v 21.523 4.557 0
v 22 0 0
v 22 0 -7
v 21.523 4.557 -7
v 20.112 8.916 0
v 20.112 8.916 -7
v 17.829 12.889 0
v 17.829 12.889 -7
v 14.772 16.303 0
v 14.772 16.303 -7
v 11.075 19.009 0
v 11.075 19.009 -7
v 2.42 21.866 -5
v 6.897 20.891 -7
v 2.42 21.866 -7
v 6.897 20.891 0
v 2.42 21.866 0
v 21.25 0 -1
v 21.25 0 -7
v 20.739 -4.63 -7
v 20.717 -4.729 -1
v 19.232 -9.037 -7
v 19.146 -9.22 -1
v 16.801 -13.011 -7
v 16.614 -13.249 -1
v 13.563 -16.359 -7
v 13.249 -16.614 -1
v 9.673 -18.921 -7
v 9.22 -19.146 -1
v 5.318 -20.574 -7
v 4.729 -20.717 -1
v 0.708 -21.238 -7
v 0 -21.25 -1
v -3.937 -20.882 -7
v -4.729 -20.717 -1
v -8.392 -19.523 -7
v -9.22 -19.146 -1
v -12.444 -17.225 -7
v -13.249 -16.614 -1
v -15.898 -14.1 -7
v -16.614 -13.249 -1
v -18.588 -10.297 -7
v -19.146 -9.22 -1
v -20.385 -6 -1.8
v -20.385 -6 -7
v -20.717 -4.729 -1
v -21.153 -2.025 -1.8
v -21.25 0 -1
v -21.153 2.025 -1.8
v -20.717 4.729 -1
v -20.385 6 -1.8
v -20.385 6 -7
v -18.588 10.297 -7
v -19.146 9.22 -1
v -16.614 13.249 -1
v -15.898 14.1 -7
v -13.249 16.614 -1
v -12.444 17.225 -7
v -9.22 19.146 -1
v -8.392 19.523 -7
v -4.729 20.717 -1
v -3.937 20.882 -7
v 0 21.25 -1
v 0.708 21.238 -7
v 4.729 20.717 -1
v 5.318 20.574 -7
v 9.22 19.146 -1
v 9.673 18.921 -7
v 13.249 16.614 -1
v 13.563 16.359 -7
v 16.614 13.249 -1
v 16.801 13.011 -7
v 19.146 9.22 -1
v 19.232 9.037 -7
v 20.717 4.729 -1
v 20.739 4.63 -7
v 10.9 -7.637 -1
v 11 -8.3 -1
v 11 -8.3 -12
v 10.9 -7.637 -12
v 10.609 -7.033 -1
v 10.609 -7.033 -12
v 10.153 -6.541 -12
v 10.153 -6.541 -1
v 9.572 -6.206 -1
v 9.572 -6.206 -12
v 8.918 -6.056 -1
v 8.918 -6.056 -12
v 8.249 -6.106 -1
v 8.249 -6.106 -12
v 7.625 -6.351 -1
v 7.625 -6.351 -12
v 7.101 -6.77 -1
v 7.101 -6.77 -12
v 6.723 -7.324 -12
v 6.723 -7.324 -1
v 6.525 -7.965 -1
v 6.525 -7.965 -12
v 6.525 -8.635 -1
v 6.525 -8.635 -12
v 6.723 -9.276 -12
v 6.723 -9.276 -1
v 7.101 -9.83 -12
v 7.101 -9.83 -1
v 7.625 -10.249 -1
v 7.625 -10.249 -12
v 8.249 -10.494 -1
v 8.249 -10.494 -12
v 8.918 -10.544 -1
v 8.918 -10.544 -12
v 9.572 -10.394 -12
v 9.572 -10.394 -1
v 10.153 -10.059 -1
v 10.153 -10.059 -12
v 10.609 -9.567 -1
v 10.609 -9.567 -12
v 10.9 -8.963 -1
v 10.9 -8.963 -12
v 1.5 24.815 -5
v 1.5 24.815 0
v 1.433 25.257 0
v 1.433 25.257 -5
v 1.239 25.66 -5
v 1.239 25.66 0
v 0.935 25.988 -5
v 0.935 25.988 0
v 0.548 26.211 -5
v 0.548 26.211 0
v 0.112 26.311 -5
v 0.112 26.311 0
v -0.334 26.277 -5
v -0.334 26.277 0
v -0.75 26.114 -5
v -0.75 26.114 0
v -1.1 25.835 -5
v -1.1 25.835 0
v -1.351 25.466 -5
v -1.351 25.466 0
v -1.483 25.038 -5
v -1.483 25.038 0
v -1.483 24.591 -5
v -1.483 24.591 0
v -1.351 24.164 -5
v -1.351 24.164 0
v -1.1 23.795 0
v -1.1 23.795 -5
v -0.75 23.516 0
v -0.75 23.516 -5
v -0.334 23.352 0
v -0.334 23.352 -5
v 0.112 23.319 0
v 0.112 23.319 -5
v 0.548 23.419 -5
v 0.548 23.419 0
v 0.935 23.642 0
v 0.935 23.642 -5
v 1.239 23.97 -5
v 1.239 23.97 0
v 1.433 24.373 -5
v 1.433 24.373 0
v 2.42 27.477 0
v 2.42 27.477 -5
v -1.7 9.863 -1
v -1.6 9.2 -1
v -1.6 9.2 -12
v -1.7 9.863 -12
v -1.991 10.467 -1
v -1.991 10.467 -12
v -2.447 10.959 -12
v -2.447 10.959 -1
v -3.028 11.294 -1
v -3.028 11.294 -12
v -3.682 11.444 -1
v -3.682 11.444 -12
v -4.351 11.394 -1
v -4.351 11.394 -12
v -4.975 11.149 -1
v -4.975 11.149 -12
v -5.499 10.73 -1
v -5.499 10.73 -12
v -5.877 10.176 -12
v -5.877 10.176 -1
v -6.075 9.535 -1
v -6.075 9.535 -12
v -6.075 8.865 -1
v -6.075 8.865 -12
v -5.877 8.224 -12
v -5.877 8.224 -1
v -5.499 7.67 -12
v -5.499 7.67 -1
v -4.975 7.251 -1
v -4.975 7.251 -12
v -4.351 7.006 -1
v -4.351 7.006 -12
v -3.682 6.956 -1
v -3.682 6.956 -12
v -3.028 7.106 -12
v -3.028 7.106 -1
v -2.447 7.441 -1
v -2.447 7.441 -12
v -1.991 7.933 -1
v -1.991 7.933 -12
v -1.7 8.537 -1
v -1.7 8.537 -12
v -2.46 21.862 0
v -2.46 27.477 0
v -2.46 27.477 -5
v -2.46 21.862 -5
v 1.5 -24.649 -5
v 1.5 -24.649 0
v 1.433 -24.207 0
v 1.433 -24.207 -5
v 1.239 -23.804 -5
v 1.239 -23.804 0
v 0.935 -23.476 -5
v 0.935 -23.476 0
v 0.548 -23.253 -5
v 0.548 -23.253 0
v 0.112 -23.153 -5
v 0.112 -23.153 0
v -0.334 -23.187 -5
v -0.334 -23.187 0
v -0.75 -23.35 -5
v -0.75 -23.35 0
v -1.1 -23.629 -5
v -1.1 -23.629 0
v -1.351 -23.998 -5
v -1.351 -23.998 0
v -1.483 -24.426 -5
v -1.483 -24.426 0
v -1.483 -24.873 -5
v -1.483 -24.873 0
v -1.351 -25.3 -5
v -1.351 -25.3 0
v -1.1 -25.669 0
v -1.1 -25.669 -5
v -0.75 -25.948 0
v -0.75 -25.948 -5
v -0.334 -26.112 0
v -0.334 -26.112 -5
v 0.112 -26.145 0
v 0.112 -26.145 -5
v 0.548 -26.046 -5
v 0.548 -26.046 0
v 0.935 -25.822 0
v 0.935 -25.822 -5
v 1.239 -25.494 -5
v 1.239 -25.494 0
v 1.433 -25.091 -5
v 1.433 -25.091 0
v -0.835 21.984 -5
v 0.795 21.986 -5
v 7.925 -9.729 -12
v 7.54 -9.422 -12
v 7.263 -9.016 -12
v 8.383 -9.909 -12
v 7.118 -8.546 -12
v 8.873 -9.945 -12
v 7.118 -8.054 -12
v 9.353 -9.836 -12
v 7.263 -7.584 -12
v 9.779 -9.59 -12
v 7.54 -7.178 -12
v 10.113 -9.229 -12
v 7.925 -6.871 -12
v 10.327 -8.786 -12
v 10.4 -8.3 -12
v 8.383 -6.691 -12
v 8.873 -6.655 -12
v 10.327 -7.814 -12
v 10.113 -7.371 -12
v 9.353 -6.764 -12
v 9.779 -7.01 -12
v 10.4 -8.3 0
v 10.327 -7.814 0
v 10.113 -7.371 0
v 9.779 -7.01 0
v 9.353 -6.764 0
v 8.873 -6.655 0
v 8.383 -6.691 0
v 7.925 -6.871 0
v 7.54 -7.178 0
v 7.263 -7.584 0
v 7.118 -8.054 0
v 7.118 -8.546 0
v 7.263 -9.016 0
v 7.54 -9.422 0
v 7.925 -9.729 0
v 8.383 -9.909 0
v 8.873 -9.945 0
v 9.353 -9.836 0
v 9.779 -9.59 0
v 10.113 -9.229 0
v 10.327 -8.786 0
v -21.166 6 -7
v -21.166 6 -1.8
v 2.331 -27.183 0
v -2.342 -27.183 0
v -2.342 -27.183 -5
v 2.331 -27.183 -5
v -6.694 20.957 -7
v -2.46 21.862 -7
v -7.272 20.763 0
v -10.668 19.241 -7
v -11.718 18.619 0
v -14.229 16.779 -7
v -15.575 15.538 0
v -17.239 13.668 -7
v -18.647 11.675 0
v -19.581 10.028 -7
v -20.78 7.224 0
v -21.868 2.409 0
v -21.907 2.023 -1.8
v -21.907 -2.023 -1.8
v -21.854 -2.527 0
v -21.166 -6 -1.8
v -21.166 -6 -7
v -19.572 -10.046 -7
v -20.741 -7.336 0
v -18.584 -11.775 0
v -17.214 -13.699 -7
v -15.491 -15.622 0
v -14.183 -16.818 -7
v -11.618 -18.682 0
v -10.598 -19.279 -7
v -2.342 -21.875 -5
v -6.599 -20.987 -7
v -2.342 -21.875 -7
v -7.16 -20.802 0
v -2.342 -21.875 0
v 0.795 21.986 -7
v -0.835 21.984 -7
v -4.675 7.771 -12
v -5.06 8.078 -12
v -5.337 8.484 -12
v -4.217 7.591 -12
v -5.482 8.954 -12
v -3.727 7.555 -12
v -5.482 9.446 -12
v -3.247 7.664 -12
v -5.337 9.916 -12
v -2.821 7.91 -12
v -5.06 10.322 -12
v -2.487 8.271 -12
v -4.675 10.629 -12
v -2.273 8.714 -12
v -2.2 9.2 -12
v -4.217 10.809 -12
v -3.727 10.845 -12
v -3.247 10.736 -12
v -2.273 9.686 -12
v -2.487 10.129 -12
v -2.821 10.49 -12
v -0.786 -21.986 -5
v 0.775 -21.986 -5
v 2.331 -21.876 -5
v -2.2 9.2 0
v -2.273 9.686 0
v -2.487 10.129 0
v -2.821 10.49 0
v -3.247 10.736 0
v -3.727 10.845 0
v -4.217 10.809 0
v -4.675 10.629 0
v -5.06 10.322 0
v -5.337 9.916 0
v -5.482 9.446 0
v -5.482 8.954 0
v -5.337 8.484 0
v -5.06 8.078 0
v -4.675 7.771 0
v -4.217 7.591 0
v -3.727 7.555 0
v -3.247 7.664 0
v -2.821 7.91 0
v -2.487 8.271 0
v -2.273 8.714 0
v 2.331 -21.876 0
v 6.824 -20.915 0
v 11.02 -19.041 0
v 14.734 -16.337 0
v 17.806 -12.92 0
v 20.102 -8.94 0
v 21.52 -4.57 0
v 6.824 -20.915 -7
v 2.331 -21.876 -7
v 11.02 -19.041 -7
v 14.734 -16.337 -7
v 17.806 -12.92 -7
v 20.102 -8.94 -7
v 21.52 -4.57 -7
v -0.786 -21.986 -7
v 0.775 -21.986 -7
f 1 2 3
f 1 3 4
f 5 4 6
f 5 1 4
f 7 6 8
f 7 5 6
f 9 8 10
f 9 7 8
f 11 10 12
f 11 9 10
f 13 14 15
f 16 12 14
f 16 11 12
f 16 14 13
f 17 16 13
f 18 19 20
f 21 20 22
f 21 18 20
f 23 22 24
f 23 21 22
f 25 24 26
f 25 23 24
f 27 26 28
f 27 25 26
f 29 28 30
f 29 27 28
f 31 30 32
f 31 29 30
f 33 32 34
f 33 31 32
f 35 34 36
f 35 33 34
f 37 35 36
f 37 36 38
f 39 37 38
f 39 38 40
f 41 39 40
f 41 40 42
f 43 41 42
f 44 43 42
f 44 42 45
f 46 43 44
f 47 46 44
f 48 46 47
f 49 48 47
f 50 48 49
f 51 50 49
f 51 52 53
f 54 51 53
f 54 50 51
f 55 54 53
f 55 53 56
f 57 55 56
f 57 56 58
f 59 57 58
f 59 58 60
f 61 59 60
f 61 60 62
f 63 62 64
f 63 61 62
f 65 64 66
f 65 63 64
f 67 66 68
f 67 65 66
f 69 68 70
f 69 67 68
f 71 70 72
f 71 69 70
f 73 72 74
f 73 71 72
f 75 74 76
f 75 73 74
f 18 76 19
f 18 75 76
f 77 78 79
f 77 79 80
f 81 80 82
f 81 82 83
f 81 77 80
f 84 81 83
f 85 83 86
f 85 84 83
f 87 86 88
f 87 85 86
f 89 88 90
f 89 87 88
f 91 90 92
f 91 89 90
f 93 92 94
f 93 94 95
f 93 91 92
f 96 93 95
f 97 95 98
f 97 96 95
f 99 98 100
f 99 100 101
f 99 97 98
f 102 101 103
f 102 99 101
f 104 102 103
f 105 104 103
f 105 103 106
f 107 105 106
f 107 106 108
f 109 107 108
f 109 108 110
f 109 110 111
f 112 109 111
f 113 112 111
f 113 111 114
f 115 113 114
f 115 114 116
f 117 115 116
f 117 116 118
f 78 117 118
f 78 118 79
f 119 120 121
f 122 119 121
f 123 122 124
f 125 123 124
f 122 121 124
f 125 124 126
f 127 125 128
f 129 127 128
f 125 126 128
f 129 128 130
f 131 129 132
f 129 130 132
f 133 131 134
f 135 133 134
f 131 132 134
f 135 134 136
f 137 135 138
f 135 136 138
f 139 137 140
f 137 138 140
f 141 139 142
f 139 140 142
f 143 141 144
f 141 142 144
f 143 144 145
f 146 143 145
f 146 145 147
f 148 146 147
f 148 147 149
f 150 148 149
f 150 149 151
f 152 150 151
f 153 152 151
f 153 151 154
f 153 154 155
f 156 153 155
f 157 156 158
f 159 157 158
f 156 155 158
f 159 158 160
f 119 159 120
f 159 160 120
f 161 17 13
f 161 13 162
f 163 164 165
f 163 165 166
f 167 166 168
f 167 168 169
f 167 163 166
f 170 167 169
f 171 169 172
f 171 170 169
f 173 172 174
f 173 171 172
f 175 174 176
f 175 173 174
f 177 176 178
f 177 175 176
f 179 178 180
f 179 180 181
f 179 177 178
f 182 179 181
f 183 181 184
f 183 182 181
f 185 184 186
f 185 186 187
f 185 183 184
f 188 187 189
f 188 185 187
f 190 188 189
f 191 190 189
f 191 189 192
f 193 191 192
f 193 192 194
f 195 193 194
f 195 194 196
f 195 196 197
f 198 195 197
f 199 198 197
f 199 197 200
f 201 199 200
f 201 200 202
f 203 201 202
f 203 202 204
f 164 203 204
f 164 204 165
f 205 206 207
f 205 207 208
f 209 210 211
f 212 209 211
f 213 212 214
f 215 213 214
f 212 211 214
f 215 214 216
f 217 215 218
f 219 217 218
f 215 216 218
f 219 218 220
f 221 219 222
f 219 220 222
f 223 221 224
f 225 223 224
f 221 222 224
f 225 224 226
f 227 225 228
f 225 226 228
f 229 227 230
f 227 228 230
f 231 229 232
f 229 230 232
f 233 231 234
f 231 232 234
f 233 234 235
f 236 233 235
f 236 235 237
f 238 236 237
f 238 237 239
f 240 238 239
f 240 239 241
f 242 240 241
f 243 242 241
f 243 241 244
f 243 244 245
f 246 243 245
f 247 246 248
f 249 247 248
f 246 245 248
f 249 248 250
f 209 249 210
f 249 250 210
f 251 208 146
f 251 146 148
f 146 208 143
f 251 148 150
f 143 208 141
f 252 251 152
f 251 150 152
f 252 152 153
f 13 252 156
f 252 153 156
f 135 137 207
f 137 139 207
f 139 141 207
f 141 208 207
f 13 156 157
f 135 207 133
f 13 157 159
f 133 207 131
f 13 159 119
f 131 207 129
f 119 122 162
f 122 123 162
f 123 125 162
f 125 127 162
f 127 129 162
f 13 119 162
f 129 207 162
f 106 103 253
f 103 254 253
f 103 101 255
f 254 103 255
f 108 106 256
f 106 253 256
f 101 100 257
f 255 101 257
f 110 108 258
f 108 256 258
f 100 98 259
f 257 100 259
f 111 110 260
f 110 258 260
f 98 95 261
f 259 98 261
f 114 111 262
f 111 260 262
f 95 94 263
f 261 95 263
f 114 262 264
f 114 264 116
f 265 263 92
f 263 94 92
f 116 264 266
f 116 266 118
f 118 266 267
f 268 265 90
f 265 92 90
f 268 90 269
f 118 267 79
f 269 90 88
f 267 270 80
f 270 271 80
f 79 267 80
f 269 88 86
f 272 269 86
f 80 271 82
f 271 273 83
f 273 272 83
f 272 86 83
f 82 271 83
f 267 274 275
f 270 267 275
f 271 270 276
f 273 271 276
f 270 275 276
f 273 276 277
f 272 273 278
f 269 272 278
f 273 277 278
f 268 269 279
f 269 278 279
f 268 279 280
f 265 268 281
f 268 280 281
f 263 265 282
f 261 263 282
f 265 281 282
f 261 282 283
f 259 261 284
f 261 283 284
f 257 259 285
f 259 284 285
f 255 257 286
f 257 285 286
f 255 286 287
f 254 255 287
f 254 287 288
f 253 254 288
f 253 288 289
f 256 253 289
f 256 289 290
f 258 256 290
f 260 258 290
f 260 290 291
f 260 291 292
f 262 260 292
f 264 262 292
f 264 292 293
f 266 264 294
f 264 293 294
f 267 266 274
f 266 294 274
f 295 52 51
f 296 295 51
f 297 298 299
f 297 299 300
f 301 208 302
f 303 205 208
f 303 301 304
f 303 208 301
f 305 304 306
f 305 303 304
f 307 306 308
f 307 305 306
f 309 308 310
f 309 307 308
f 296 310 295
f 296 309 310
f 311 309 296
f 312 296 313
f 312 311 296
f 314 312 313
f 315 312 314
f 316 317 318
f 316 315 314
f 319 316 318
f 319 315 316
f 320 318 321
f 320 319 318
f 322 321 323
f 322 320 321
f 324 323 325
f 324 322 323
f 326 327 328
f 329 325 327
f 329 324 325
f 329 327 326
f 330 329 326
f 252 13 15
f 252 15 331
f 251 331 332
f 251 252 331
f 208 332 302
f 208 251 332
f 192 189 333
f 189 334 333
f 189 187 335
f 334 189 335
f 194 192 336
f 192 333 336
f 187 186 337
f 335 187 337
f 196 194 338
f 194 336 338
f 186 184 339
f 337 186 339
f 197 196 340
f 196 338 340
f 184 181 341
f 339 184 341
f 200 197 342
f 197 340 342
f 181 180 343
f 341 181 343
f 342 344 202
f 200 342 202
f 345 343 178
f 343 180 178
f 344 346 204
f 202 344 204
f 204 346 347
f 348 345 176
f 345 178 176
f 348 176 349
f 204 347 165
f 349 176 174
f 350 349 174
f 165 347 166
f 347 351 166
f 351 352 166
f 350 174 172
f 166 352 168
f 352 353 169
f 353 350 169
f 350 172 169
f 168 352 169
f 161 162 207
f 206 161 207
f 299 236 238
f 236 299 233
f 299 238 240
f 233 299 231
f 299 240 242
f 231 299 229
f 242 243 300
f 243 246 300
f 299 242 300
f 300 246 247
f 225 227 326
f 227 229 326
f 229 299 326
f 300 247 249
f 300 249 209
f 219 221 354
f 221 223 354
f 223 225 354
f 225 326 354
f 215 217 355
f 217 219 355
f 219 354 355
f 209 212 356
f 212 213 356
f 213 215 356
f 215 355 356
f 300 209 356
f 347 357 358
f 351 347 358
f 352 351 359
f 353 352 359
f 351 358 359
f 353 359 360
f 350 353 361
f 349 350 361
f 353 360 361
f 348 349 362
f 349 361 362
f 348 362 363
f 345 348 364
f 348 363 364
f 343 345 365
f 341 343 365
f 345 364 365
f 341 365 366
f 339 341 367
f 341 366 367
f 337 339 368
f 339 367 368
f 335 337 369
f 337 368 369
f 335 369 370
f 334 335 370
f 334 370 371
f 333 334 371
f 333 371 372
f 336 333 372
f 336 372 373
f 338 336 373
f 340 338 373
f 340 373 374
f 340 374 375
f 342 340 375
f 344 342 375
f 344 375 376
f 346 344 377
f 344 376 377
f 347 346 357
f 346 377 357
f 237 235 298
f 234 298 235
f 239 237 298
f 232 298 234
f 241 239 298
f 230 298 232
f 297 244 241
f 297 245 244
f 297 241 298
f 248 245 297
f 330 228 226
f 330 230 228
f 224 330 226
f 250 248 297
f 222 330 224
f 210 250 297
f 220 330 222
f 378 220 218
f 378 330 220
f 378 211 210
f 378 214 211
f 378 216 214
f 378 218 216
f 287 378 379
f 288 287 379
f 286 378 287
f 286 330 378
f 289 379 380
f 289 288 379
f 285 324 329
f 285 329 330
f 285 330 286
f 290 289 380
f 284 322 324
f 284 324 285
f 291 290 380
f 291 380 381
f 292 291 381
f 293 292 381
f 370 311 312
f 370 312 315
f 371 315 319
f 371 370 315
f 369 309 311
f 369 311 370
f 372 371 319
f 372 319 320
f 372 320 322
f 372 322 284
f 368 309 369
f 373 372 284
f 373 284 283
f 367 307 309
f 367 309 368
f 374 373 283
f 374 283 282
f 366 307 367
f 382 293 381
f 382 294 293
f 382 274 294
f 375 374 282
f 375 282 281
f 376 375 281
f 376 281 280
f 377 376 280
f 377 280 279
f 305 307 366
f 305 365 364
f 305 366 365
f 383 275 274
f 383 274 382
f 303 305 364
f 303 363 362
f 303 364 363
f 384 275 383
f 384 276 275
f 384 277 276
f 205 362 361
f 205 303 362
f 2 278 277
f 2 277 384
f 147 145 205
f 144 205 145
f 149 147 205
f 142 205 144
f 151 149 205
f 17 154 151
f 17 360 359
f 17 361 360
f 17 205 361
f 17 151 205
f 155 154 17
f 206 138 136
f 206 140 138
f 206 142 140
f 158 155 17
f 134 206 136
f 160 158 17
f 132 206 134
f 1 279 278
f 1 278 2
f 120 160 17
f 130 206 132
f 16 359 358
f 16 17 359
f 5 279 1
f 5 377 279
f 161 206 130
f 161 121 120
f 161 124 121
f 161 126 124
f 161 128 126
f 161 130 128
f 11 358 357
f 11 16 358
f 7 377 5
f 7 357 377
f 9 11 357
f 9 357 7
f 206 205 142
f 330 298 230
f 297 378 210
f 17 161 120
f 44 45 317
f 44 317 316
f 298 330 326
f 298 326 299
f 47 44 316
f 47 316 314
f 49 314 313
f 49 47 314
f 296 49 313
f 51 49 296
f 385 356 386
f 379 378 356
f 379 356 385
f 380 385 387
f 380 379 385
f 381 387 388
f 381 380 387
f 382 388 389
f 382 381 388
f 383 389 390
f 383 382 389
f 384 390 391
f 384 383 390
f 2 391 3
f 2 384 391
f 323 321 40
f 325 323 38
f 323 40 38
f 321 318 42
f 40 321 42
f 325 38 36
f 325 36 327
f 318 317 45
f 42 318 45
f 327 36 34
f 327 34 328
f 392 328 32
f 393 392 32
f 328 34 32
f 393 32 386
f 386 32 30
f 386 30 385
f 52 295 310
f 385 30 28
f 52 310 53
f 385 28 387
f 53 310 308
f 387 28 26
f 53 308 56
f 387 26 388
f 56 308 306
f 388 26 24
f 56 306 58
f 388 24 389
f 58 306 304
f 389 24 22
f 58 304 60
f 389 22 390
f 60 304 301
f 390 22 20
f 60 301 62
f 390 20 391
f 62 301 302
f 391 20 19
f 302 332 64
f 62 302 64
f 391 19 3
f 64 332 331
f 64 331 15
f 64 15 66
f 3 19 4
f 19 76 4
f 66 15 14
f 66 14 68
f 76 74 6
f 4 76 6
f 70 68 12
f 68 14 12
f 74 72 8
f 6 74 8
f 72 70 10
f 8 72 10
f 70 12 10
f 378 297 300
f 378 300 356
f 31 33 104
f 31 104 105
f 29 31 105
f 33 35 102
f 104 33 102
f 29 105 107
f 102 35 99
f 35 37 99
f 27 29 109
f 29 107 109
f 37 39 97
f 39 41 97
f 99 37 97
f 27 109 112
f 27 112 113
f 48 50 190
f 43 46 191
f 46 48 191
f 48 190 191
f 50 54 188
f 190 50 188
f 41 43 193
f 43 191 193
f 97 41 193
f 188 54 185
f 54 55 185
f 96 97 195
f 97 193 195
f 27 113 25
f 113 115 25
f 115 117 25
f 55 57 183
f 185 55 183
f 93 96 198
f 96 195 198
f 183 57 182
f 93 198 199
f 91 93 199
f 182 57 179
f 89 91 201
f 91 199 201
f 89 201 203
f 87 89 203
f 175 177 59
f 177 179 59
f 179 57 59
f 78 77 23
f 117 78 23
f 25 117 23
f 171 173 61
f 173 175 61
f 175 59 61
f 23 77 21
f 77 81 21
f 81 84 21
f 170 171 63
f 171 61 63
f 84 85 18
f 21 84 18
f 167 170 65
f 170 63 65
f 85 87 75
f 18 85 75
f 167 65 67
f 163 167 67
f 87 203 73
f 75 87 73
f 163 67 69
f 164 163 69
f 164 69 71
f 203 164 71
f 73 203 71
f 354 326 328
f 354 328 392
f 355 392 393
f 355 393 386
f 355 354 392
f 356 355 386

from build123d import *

# Parameters (mm, degrees)
F0_W     = 23.9
F0_H     = 23
F1_DEPTH = 7
F0_R     = 2.25
F2_DEPTH = 1
F3_W     = 12
F3_H     = 6
F4_DEPTH = 25
F5_R     = 21.25
F6_DEPTH = 10
F0_R_2   = 1.65
F7_DEPTH = 12
F0_R_3   = 1.5
F8_DEPTH = 5


# Not quite as in the source:
# - a feature names something its author has since deleted; it is built from what else it names


with BuildPart() as f1:
    # F0 (on Top) → F1 (new body)
    with BuildSketch(Plane.XY):
        with BuildLine():
            ThreePointArc((2.3312262639, -21.8761373214), (16.3598132295, -14.70906221), (22, 0))
            ThreePointArc((22, 0), (16.3897820024, 14.6756616857), (2.4204503716, 21.86644507))
            ThreePointArc((2.4204503716, 21.86644507), (-0.0200709954, 21.9999908444), (-2.4603446274, 21.8619922311))
            ThreePointArc((-2.4603446274, 21.8619922311), (-21.9999200002, -0.059329476), (-2.3423946746, -21.8749442785))
            ThreePointArc((-2.3423946746, -21.8749442785), (-0.0056159761, -21.9999992832), (2.3312262639, -21.8761373214))
        make_face()
        Rectangle(F0_W, F0_H, mode=Mode.SUBTRACT)
    extrude(amount=-F1_DEPTH)

    # F0 (on Top) → F2 (join)
    with BuildSketch(Plane.XY):
        Rectangle(F0_W, F0_H)
        with Locations((8.75, -8.3)):
            Circle(F0_R, mode=Mode.SUBTRACT)
        with Locations((-3.85, 9.2)):
            Circle(F0_R, mode=Mode.SUBTRACT)
    extrude(amount=-F2_DEPTH)

    # F3 (on face) → F4 (cut)
    with BuildSketch(Plane.YZ.offset(-11.95)):
        with Locations((0, -4.8)):
            Rectangle(F3_W, F3_H)
    extrude(amount=-F4_DEPTH, mode=Mode.SUBTRACT)

    # F5 (on face) → F6 (cut)
    with BuildSketch(Plane(origin=(0, 0, -1), x_dir=(1, 0, 0), z_dir=(0, 0, -1))):
        Circle(F5_R)
    extrude(amount=F6_DEPTH, mode=Mode.SUBTRACT)

    # F0 (on Top) → F7 (join)
    with BuildSketch(Plane.XY):
        with Locations((-3.85, 9.2)):
            Circle(F0_R)
        with Locations((-3.85, 9.2)):
            Circle(F0_R_2, mode=Mode.SUBTRACT)
        with Locations((8.75, -8.3)):
            Circle(F0_R)
        with Locations((8.75, -8.3)):
            Circle(F0_R_2, mode=Mode.SUBTRACT)
    extrude(amount=-F7_DEPTH)

    # F0 (on Top) → F8 (join)
    with BuildSketch(Plane.XY):
        with BuildLine():
            ThreePointArc((-2.4603446274, 21.8619922311), (-0.0200709954, 21.9999908444), (2.4204503716, 21.86644507))
            Line((2.4204503716, 21.86644507), (2.4204503716, 27.4773144078))
            Line((2.4204503716, 27.4773144078), (-2.4603446274, 27.4773144078))
            Line((-2.4603446274, 27.4773144078), (-2.4603446274, 21.8619922311))
        make_face()
        with Locations((0, 24.8148497194)):
            Circle(F0_R_3, mode=Mode.SUBTRACT)
        with BuildLine():
            Line((2.3312262639, -27.183307051), (2.3312262639, -21.8761373214))
            ThreePointArc((2.3312262639, -21.8761373214), (-0.0056159761, -21.9999992832), (-2.3423946746, -21.8749442785))
            Line((-2.3423946746, -21.8749442785), (-2.3423946746, -27.183307051))
            Line((-2.3423946746, -27.183307051), (2.3312262639, -27.183307051))
        make_face()
        with Locations((0, -24.6492363513)):
            Circle(F0_R_3, mode=Mode.SUBTRACT)
    extrude(amount=-F8_DEPTH)


solid = f1.part
